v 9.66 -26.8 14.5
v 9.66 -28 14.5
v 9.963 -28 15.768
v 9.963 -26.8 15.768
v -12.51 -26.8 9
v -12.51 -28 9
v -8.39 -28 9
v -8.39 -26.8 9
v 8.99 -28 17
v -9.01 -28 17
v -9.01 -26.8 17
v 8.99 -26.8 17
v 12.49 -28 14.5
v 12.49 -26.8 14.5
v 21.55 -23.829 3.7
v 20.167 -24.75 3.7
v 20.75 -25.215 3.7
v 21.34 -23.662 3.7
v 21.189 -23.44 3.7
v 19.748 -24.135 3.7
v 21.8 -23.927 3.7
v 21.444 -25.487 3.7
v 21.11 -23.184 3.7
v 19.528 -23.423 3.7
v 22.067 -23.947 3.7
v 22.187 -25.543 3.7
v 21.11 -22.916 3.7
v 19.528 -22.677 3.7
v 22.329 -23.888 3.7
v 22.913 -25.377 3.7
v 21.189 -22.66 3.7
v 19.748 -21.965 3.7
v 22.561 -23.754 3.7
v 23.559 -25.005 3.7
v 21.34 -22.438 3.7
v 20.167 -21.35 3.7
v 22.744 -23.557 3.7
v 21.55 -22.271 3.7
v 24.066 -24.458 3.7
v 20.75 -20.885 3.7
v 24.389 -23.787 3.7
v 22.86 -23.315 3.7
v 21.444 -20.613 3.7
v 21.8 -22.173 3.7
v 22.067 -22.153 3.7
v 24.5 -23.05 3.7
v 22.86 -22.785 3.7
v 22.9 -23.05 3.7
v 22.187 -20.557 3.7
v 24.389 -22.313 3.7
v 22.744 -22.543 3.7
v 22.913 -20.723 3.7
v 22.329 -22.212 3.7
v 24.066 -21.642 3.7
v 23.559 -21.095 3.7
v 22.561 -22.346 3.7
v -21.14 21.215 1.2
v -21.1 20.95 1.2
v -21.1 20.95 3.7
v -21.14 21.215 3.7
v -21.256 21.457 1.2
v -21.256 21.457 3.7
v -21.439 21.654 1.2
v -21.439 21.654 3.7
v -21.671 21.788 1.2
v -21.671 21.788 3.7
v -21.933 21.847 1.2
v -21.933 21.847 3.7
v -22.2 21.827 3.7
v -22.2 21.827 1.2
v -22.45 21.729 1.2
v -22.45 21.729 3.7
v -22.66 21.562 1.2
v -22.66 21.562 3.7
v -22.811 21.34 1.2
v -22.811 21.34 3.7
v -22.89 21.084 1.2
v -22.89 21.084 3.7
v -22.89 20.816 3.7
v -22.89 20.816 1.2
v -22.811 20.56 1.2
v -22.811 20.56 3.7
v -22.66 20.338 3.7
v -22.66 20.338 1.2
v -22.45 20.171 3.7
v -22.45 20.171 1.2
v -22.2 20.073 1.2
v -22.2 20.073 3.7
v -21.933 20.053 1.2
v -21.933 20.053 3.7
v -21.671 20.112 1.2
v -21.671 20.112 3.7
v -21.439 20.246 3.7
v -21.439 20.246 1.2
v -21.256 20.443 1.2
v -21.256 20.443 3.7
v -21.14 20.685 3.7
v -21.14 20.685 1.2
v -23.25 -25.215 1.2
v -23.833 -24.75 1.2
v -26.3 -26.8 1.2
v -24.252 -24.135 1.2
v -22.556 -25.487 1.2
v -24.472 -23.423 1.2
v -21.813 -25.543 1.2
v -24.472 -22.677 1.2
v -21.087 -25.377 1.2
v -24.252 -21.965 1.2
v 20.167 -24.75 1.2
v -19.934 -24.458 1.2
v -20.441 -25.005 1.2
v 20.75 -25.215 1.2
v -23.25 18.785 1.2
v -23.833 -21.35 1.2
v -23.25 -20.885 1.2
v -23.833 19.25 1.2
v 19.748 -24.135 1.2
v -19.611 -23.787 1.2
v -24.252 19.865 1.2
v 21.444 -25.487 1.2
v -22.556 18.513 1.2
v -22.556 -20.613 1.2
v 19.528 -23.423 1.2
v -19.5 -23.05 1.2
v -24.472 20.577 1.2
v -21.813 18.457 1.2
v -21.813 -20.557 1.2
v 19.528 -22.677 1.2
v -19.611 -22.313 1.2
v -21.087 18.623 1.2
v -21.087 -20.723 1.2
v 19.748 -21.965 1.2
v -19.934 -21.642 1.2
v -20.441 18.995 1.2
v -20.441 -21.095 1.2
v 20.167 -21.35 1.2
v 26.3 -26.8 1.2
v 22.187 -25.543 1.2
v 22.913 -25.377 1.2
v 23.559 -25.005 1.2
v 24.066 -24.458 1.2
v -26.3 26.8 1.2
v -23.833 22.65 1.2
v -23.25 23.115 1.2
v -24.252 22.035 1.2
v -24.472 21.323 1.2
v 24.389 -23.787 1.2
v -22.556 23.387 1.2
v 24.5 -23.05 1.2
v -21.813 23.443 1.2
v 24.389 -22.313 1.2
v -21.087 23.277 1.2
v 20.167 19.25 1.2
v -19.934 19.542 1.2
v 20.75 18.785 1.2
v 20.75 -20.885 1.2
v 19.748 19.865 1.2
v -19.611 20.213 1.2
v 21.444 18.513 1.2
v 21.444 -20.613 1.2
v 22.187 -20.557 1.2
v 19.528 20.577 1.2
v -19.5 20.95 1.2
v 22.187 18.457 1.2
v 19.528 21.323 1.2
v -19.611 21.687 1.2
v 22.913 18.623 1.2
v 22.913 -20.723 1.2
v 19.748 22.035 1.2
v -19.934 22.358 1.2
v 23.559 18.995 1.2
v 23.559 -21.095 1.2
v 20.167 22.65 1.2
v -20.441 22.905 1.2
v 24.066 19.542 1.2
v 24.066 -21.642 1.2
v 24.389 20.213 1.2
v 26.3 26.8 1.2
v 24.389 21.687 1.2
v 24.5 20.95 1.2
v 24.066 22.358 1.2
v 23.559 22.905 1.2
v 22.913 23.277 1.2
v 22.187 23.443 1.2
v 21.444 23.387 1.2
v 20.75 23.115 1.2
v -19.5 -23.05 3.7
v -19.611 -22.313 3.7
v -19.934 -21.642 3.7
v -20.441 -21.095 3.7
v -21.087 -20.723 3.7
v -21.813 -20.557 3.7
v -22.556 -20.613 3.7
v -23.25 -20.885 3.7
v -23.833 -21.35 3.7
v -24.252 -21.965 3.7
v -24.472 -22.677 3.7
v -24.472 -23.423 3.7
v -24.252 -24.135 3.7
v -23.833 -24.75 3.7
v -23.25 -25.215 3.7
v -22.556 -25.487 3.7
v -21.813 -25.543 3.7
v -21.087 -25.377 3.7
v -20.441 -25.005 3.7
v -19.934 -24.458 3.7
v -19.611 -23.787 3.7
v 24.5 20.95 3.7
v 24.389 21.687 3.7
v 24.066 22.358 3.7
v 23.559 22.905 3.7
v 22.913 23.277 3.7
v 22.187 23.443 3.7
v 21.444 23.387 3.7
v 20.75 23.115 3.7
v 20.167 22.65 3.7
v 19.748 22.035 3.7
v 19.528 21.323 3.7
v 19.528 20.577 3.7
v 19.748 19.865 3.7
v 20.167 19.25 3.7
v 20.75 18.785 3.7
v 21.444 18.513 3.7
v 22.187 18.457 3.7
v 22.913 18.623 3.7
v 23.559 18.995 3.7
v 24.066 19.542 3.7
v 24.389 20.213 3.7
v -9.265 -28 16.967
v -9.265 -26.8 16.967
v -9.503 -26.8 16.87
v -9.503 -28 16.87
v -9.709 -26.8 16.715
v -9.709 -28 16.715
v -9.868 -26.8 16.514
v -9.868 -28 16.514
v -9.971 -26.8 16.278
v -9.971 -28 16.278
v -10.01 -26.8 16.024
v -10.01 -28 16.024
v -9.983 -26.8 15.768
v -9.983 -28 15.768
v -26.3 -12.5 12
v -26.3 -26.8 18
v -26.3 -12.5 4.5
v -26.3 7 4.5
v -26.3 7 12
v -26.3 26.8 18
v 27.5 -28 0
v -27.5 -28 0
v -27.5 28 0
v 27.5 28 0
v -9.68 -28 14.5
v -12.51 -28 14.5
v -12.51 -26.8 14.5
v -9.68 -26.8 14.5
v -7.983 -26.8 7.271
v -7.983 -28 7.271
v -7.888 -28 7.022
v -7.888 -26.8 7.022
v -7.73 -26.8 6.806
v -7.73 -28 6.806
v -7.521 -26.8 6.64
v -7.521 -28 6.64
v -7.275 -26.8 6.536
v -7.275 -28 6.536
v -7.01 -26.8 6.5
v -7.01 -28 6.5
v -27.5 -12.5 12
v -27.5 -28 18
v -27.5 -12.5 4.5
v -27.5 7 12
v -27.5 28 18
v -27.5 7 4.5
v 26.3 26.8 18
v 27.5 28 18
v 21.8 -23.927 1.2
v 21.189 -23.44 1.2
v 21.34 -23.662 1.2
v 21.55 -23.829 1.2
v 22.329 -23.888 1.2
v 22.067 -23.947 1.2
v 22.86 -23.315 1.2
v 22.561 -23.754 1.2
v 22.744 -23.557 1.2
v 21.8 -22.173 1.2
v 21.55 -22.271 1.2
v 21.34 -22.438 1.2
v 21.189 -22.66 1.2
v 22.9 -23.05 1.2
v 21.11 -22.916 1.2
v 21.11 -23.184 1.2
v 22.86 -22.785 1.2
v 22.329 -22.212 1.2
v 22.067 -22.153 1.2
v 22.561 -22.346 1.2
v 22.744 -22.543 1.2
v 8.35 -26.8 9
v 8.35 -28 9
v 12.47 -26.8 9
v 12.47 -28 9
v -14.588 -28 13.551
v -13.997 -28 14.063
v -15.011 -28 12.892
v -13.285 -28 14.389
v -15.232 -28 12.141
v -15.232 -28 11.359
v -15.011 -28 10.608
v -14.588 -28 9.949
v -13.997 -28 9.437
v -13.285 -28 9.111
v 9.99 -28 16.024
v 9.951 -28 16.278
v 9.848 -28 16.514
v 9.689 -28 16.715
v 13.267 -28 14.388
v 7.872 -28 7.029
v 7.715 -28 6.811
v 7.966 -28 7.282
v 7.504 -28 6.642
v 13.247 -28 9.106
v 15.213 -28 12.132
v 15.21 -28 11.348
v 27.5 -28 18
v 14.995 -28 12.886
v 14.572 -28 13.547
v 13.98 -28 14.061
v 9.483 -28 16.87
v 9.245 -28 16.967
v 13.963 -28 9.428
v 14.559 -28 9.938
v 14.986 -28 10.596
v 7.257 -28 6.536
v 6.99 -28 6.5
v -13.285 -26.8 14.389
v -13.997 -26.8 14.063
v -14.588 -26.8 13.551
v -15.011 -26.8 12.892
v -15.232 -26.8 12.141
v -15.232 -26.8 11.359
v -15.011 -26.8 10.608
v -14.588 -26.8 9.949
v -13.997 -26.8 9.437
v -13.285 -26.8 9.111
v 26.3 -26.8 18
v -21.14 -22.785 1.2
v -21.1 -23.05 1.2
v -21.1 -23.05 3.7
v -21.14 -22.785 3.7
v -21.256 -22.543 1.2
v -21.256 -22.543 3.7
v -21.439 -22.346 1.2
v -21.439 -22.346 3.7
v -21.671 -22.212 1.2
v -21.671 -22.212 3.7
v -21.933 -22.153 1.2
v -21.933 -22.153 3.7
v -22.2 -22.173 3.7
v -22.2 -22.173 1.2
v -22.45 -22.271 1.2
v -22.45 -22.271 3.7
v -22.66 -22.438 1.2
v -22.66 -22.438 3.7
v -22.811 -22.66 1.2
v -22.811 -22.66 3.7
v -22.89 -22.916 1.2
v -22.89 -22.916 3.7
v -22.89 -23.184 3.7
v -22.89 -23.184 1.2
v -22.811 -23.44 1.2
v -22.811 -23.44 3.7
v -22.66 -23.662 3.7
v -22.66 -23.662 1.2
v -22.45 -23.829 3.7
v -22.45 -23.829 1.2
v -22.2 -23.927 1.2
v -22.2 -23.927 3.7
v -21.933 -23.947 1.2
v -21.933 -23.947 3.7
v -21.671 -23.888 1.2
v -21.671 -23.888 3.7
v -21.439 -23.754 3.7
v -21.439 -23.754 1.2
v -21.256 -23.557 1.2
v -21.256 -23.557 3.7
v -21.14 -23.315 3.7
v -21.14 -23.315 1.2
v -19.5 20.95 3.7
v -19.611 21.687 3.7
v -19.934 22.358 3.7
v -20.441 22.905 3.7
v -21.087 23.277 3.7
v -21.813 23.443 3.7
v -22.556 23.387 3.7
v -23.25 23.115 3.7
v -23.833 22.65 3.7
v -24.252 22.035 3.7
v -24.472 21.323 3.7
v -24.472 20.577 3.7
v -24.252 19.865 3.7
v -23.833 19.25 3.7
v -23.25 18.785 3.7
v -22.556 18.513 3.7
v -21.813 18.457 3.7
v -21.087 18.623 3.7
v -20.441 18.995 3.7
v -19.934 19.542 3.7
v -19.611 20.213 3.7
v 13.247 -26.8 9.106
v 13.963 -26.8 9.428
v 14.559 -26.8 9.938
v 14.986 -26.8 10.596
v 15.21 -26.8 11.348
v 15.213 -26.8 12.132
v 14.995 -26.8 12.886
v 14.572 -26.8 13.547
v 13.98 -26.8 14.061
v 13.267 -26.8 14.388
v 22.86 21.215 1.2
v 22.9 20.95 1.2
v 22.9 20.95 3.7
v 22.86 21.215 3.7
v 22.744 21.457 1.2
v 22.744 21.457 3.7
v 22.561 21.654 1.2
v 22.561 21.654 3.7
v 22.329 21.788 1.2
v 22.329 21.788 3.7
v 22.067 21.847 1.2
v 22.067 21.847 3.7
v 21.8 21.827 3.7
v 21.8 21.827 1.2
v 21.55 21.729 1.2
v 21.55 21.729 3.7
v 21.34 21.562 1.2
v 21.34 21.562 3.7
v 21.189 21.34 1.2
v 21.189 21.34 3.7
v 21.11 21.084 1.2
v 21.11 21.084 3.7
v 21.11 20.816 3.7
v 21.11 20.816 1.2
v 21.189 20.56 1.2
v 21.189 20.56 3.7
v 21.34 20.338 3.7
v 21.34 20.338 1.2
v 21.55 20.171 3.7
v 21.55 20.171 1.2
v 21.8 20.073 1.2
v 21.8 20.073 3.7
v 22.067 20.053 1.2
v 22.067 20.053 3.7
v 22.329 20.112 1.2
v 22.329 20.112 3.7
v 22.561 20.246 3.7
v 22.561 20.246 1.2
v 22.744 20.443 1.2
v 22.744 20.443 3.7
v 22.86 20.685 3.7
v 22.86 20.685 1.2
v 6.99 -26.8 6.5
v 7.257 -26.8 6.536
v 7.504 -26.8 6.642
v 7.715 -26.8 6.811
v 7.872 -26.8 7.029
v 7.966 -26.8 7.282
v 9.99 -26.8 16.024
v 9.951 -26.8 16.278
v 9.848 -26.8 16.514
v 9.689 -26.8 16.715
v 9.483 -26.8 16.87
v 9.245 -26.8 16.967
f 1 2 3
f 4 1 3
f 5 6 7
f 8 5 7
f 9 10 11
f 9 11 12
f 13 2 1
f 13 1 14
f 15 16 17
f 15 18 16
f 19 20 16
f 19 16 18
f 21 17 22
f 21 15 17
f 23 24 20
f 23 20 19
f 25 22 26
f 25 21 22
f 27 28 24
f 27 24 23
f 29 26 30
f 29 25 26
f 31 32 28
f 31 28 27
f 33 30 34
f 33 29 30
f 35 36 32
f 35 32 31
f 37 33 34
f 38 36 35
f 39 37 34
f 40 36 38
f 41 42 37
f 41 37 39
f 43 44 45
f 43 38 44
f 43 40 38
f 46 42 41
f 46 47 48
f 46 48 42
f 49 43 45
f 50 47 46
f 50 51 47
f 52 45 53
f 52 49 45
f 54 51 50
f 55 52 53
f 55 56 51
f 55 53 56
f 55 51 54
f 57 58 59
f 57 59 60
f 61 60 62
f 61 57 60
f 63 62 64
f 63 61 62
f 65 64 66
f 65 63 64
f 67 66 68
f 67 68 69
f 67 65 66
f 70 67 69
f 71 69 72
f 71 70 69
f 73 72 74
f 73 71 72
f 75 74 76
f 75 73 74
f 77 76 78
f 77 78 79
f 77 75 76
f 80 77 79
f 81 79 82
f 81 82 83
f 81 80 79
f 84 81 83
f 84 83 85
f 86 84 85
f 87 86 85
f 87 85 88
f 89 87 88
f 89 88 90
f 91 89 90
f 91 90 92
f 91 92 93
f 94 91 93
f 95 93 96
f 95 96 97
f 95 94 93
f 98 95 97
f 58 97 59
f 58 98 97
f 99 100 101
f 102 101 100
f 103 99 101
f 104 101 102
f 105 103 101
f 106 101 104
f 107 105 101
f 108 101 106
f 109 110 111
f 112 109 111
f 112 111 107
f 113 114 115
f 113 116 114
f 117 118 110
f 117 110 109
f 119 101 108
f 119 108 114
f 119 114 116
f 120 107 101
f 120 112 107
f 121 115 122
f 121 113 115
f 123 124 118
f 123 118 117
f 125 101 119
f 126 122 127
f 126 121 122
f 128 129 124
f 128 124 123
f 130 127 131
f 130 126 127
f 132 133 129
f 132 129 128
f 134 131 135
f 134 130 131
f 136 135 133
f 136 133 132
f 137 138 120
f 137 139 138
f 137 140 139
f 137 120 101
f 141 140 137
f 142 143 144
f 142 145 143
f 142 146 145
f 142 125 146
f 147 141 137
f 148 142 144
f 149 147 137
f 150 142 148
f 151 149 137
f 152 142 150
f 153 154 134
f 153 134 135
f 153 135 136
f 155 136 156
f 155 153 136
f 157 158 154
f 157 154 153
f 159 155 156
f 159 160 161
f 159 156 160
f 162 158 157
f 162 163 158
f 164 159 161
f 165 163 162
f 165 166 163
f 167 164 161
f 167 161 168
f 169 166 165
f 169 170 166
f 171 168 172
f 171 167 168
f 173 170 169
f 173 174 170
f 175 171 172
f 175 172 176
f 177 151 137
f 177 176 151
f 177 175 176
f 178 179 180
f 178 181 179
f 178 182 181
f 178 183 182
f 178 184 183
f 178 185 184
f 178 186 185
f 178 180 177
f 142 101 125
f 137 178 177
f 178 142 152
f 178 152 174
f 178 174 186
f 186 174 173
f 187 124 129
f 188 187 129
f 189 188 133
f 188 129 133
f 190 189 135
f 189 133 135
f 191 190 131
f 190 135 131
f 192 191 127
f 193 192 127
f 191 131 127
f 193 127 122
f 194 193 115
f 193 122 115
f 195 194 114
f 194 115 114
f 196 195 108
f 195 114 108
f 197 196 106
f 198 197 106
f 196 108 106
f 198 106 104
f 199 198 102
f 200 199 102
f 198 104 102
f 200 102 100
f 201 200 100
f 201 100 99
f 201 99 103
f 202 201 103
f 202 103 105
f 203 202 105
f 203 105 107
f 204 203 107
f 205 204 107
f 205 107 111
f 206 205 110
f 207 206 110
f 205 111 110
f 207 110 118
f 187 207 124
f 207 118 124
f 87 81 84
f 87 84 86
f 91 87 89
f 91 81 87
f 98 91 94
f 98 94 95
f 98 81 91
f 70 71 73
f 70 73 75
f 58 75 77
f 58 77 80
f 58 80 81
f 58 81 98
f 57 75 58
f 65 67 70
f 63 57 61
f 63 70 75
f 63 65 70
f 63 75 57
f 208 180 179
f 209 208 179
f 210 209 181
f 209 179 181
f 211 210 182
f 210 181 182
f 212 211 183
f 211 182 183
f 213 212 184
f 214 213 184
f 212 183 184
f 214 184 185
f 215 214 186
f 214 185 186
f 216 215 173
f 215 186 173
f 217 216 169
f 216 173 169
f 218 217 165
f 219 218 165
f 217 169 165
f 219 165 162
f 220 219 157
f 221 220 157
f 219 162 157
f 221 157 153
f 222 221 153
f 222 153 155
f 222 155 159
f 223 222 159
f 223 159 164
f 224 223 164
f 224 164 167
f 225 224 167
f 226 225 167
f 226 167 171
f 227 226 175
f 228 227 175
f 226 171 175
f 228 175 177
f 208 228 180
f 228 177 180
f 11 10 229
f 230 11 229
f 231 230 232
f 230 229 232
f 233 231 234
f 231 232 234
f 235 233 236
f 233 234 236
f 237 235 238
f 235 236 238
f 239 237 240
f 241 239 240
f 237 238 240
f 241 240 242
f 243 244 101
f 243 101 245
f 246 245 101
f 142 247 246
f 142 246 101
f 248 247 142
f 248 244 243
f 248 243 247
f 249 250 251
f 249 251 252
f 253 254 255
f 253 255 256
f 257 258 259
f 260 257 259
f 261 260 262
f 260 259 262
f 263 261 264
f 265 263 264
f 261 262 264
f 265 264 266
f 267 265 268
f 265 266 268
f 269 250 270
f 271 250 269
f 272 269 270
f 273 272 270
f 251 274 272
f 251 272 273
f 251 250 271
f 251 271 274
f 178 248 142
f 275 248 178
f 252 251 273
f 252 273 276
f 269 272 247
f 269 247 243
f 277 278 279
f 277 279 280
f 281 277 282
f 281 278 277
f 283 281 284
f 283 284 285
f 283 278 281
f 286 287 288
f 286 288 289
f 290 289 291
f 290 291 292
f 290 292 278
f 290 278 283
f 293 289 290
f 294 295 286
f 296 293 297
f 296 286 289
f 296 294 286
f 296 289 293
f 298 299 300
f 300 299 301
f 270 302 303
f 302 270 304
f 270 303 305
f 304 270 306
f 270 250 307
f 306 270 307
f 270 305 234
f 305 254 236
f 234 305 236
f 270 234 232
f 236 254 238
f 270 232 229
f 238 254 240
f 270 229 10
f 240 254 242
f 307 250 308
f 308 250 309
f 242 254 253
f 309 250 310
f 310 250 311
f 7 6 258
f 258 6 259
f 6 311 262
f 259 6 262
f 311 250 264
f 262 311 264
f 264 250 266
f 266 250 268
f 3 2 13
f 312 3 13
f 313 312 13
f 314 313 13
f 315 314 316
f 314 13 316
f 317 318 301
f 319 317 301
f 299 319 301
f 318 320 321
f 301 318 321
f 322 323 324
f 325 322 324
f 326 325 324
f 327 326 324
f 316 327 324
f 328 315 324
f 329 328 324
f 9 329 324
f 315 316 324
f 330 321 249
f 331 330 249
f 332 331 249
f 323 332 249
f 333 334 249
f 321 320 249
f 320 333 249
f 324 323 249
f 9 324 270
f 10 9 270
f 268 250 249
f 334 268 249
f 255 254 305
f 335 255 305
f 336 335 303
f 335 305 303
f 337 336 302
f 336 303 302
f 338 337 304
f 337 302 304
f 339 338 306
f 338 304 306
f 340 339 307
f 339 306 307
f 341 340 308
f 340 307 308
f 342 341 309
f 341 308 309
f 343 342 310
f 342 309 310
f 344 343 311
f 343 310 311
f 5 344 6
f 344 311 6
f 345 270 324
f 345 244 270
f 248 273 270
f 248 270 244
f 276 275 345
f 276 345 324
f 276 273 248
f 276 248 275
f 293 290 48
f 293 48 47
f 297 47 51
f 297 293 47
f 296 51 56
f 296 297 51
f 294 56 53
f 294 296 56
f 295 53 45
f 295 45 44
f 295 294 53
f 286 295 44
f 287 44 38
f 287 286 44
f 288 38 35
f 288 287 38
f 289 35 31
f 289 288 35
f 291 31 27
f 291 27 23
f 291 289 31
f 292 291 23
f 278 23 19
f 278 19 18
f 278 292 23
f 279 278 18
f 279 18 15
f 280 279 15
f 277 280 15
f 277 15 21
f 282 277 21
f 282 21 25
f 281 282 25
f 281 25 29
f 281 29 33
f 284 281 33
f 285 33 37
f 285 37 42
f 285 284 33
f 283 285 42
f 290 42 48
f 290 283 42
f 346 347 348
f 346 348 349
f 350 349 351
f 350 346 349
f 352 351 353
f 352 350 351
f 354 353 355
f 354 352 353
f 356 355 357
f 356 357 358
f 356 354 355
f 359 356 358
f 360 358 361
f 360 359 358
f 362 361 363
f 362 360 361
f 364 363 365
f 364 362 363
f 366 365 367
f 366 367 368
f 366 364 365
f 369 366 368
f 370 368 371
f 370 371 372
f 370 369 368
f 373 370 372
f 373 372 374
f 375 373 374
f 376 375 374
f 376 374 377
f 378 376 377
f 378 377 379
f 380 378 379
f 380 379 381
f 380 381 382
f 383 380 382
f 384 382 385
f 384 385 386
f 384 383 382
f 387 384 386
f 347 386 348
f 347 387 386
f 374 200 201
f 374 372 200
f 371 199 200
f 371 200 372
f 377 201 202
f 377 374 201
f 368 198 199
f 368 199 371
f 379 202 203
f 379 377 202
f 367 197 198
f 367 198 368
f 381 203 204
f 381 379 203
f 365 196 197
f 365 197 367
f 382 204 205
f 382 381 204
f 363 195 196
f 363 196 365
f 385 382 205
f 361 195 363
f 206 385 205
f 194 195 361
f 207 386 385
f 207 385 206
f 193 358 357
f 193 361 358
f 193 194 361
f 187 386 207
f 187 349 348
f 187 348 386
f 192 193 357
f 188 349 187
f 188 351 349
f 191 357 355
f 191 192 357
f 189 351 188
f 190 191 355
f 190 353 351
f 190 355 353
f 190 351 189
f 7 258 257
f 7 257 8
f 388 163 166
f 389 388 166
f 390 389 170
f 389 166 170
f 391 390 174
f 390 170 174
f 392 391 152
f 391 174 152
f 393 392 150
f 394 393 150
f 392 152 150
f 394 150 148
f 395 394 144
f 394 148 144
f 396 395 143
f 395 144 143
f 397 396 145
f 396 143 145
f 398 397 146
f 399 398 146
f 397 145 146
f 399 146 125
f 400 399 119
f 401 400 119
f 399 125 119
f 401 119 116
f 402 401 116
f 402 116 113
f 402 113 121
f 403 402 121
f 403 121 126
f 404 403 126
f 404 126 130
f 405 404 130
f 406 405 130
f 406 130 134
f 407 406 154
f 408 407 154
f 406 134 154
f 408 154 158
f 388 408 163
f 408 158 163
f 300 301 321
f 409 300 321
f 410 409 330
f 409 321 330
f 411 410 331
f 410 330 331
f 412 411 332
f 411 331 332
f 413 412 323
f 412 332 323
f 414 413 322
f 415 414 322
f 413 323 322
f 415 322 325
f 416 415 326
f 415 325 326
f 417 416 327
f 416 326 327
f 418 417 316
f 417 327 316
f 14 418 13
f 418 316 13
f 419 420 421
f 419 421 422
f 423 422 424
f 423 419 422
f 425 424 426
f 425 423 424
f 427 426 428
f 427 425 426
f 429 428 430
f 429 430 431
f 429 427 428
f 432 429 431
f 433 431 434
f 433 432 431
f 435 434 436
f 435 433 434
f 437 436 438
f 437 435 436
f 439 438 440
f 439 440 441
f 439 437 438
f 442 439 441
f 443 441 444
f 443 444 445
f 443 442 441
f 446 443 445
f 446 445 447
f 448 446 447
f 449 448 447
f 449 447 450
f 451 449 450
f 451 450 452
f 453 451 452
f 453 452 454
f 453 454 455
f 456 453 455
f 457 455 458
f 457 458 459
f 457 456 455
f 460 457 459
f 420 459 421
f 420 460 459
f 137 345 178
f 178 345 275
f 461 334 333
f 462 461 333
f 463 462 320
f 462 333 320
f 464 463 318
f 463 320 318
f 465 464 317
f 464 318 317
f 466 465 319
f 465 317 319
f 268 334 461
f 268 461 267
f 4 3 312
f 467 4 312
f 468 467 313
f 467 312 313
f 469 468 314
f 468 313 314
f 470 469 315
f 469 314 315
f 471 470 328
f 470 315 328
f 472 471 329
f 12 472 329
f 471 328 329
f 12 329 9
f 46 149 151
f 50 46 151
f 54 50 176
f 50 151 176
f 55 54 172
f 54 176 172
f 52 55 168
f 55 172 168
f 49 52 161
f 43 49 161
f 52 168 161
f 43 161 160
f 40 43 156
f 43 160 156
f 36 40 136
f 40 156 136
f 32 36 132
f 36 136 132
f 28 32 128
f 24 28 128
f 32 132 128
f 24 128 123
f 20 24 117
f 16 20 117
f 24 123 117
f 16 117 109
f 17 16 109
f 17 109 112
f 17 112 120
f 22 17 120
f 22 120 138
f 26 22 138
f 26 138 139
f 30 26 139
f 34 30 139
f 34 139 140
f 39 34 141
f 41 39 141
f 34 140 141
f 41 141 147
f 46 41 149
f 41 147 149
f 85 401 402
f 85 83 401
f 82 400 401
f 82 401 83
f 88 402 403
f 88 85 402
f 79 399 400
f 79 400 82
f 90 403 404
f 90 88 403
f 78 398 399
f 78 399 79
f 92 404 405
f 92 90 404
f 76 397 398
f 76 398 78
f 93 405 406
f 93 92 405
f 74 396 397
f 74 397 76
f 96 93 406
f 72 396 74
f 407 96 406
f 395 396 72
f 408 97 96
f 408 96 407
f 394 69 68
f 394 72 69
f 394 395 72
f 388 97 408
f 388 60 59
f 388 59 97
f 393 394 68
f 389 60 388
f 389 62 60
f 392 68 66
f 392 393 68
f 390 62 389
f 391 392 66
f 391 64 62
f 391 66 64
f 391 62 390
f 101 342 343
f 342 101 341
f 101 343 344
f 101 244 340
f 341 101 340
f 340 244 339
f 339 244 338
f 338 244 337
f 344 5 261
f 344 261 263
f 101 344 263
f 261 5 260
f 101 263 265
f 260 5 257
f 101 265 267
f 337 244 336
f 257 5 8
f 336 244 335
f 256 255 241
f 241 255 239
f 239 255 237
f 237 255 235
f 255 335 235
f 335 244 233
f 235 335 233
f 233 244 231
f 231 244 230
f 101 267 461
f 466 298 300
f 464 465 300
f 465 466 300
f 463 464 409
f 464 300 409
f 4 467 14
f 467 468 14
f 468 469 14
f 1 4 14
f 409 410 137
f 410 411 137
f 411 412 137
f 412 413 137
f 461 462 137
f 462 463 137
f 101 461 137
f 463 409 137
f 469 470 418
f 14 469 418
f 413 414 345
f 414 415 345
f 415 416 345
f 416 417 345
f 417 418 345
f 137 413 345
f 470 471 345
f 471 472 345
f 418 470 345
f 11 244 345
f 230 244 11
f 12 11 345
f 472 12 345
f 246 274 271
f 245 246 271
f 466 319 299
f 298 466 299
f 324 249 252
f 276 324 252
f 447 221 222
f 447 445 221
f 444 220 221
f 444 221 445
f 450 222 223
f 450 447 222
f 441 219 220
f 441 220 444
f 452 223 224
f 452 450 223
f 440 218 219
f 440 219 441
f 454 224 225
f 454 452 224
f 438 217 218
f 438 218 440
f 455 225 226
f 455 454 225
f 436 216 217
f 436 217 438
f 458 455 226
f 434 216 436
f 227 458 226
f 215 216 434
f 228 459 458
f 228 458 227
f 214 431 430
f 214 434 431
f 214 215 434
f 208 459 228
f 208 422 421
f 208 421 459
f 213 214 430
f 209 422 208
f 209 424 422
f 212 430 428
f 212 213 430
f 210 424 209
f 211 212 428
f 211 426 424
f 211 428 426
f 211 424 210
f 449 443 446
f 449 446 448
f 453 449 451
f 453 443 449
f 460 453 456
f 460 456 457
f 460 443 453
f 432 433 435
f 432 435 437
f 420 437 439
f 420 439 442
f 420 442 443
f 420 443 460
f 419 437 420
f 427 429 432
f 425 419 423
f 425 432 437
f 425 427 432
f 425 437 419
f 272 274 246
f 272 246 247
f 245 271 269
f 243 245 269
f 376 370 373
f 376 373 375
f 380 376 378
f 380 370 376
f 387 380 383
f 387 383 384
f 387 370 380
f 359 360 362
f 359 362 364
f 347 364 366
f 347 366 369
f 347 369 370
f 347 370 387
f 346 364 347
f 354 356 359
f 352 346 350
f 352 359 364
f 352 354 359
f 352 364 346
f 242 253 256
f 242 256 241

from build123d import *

# Parameters (mm, degrees)
SKETCH_W        = 55
SKETCH_H        = 56
PAD_DEPTH       = 18
SKETCH012_W     = 52.6
SKETCH012_H     = 53.6
POCKET_DEPTH    = 16.8
POCKET001_DEPTH = 1.2
SKETCH014_W     = 19.5
SKETCH014_H     = 7.5
POCKET002_DEPTH = 1.2
SKETCH015_R     = 2.5
SKETCH015_R_2   = 0.9
PAD010_DEPTH    = 2.5


with BuildPart() as part:
    # Sketch → Pad (new body)
    with BuildSketch(Plane.XY):
        Rectangle(SKETCH_W, SKETCH_H)
    extrude(amount=PAD_DEPTH)

    # Sketch012 (on Face6 of Pad) → Pocket (cut)
    with BuildSketch(Plane.XY.offset(18)):
        Rectangle(SKETCH012_W, SKETCH012_H)
    extrude(amount=-POCKET_DEPTH, mode=Mode.SUBTRACT)

    # Sketch013 (on Face6 of Pocket) → Pocket001 (cut)
    with BuildSketch(Plane.XZ.offset(28)):
        with BuildLine():
            ThreePointArc((12.47, 9.000073), (15.239982, 11.74), (12.49, 14.5))
            Line((9.66, 14.5), (12.49, 14.5))
            Line((9.66, 14.5), (9.962666, 15.767791))
            ThreePointArc((9.962666, 15.767791), (9.774923, 16.619593), (8.99, 17))
            Line((-9.01, 17), (8.99, 17))
            ThreePointArc((-9.01, 17), (-9.794923, 16.619593), (-9.982666, 15.767791))
            Line((-9.68, 14.5), (-9.982666, 15.767791))
            Line((-12.51, 14.5), (-9.68, 14.5))
            ThreePointArc((-12.51, 14.5), (-15.26, 11.75), (-12.51, 9))
            Line((-12.51, 9), (-8.39, 9))
            Line((-7.983449, 7.271094), (-8.39, 9))
            ThreePointArc((-7.983449, 7.271094), (-7.630924, 6.716129), (-7.01, 6.5))
            Line((6.99, 6.5), (-7.01, 6.5))
            ThreePointArc((6.99, 6.5), (7.615236, 6.719564), (7.965913, 7.281839))
            Line((7.965913, 7.281839), (8.35, 9))
            Line((8.35, 9), (12.47, 9.000073))
        make_face()
    extrude(amount=-POCKET001_DEPTH, mode=Mode.SUBTRACT)

    # Sketch014 (on Face2 of Pocket001) → Pocket002 (cut)
    with BuildSketch(Plane(origin=(-27.5, 0, 0), x_dir=(0, -1, 0), z_dir=(-1, 0, 0))):
        with Locations((2.75, 8.25)):
            Rectangle(SKETCH014_W, SKETCH014_H)
    extrude(amount=-POCKET002_DEPTH, mode=Mode.SUBTRACT)

    # Sketch015 (on Face31 of Pocket002) → Pad010 (join)
    with BuildSketch(Plane.XY.offset(1.2)):
        with Locations((22, -23.05)):
            Circle(SKETCH015_R)
        with Locations((22, -23.05)):
            Circle(SKETCH015_R_2, mode=Mode.SUBTRACT)
        with Locations((-22, -23.05)):
            Circle(SKETCH015_R)
        with Locations((-22, -23.05)):
            Circle(SKETCH015_R_2, mode=Mode.SUBTRACT)
        with Locations((22, 20.95)):
            Circle(SKETCH015_R)
        with Locations((22, 20.95)):
            Circle(SKETCH015_R_2, mode=Mode.SUBTRACT)
        with Locations((-22, 20.95)):
            Circle(SKETCH015_R)
        with Locations((-22, 20.95)):
            Circle(SKETCH015_R_2, mode=Mode.SUBTRACT)
    extrude(amount=PAD010_DEPTH)


solid = part.part
